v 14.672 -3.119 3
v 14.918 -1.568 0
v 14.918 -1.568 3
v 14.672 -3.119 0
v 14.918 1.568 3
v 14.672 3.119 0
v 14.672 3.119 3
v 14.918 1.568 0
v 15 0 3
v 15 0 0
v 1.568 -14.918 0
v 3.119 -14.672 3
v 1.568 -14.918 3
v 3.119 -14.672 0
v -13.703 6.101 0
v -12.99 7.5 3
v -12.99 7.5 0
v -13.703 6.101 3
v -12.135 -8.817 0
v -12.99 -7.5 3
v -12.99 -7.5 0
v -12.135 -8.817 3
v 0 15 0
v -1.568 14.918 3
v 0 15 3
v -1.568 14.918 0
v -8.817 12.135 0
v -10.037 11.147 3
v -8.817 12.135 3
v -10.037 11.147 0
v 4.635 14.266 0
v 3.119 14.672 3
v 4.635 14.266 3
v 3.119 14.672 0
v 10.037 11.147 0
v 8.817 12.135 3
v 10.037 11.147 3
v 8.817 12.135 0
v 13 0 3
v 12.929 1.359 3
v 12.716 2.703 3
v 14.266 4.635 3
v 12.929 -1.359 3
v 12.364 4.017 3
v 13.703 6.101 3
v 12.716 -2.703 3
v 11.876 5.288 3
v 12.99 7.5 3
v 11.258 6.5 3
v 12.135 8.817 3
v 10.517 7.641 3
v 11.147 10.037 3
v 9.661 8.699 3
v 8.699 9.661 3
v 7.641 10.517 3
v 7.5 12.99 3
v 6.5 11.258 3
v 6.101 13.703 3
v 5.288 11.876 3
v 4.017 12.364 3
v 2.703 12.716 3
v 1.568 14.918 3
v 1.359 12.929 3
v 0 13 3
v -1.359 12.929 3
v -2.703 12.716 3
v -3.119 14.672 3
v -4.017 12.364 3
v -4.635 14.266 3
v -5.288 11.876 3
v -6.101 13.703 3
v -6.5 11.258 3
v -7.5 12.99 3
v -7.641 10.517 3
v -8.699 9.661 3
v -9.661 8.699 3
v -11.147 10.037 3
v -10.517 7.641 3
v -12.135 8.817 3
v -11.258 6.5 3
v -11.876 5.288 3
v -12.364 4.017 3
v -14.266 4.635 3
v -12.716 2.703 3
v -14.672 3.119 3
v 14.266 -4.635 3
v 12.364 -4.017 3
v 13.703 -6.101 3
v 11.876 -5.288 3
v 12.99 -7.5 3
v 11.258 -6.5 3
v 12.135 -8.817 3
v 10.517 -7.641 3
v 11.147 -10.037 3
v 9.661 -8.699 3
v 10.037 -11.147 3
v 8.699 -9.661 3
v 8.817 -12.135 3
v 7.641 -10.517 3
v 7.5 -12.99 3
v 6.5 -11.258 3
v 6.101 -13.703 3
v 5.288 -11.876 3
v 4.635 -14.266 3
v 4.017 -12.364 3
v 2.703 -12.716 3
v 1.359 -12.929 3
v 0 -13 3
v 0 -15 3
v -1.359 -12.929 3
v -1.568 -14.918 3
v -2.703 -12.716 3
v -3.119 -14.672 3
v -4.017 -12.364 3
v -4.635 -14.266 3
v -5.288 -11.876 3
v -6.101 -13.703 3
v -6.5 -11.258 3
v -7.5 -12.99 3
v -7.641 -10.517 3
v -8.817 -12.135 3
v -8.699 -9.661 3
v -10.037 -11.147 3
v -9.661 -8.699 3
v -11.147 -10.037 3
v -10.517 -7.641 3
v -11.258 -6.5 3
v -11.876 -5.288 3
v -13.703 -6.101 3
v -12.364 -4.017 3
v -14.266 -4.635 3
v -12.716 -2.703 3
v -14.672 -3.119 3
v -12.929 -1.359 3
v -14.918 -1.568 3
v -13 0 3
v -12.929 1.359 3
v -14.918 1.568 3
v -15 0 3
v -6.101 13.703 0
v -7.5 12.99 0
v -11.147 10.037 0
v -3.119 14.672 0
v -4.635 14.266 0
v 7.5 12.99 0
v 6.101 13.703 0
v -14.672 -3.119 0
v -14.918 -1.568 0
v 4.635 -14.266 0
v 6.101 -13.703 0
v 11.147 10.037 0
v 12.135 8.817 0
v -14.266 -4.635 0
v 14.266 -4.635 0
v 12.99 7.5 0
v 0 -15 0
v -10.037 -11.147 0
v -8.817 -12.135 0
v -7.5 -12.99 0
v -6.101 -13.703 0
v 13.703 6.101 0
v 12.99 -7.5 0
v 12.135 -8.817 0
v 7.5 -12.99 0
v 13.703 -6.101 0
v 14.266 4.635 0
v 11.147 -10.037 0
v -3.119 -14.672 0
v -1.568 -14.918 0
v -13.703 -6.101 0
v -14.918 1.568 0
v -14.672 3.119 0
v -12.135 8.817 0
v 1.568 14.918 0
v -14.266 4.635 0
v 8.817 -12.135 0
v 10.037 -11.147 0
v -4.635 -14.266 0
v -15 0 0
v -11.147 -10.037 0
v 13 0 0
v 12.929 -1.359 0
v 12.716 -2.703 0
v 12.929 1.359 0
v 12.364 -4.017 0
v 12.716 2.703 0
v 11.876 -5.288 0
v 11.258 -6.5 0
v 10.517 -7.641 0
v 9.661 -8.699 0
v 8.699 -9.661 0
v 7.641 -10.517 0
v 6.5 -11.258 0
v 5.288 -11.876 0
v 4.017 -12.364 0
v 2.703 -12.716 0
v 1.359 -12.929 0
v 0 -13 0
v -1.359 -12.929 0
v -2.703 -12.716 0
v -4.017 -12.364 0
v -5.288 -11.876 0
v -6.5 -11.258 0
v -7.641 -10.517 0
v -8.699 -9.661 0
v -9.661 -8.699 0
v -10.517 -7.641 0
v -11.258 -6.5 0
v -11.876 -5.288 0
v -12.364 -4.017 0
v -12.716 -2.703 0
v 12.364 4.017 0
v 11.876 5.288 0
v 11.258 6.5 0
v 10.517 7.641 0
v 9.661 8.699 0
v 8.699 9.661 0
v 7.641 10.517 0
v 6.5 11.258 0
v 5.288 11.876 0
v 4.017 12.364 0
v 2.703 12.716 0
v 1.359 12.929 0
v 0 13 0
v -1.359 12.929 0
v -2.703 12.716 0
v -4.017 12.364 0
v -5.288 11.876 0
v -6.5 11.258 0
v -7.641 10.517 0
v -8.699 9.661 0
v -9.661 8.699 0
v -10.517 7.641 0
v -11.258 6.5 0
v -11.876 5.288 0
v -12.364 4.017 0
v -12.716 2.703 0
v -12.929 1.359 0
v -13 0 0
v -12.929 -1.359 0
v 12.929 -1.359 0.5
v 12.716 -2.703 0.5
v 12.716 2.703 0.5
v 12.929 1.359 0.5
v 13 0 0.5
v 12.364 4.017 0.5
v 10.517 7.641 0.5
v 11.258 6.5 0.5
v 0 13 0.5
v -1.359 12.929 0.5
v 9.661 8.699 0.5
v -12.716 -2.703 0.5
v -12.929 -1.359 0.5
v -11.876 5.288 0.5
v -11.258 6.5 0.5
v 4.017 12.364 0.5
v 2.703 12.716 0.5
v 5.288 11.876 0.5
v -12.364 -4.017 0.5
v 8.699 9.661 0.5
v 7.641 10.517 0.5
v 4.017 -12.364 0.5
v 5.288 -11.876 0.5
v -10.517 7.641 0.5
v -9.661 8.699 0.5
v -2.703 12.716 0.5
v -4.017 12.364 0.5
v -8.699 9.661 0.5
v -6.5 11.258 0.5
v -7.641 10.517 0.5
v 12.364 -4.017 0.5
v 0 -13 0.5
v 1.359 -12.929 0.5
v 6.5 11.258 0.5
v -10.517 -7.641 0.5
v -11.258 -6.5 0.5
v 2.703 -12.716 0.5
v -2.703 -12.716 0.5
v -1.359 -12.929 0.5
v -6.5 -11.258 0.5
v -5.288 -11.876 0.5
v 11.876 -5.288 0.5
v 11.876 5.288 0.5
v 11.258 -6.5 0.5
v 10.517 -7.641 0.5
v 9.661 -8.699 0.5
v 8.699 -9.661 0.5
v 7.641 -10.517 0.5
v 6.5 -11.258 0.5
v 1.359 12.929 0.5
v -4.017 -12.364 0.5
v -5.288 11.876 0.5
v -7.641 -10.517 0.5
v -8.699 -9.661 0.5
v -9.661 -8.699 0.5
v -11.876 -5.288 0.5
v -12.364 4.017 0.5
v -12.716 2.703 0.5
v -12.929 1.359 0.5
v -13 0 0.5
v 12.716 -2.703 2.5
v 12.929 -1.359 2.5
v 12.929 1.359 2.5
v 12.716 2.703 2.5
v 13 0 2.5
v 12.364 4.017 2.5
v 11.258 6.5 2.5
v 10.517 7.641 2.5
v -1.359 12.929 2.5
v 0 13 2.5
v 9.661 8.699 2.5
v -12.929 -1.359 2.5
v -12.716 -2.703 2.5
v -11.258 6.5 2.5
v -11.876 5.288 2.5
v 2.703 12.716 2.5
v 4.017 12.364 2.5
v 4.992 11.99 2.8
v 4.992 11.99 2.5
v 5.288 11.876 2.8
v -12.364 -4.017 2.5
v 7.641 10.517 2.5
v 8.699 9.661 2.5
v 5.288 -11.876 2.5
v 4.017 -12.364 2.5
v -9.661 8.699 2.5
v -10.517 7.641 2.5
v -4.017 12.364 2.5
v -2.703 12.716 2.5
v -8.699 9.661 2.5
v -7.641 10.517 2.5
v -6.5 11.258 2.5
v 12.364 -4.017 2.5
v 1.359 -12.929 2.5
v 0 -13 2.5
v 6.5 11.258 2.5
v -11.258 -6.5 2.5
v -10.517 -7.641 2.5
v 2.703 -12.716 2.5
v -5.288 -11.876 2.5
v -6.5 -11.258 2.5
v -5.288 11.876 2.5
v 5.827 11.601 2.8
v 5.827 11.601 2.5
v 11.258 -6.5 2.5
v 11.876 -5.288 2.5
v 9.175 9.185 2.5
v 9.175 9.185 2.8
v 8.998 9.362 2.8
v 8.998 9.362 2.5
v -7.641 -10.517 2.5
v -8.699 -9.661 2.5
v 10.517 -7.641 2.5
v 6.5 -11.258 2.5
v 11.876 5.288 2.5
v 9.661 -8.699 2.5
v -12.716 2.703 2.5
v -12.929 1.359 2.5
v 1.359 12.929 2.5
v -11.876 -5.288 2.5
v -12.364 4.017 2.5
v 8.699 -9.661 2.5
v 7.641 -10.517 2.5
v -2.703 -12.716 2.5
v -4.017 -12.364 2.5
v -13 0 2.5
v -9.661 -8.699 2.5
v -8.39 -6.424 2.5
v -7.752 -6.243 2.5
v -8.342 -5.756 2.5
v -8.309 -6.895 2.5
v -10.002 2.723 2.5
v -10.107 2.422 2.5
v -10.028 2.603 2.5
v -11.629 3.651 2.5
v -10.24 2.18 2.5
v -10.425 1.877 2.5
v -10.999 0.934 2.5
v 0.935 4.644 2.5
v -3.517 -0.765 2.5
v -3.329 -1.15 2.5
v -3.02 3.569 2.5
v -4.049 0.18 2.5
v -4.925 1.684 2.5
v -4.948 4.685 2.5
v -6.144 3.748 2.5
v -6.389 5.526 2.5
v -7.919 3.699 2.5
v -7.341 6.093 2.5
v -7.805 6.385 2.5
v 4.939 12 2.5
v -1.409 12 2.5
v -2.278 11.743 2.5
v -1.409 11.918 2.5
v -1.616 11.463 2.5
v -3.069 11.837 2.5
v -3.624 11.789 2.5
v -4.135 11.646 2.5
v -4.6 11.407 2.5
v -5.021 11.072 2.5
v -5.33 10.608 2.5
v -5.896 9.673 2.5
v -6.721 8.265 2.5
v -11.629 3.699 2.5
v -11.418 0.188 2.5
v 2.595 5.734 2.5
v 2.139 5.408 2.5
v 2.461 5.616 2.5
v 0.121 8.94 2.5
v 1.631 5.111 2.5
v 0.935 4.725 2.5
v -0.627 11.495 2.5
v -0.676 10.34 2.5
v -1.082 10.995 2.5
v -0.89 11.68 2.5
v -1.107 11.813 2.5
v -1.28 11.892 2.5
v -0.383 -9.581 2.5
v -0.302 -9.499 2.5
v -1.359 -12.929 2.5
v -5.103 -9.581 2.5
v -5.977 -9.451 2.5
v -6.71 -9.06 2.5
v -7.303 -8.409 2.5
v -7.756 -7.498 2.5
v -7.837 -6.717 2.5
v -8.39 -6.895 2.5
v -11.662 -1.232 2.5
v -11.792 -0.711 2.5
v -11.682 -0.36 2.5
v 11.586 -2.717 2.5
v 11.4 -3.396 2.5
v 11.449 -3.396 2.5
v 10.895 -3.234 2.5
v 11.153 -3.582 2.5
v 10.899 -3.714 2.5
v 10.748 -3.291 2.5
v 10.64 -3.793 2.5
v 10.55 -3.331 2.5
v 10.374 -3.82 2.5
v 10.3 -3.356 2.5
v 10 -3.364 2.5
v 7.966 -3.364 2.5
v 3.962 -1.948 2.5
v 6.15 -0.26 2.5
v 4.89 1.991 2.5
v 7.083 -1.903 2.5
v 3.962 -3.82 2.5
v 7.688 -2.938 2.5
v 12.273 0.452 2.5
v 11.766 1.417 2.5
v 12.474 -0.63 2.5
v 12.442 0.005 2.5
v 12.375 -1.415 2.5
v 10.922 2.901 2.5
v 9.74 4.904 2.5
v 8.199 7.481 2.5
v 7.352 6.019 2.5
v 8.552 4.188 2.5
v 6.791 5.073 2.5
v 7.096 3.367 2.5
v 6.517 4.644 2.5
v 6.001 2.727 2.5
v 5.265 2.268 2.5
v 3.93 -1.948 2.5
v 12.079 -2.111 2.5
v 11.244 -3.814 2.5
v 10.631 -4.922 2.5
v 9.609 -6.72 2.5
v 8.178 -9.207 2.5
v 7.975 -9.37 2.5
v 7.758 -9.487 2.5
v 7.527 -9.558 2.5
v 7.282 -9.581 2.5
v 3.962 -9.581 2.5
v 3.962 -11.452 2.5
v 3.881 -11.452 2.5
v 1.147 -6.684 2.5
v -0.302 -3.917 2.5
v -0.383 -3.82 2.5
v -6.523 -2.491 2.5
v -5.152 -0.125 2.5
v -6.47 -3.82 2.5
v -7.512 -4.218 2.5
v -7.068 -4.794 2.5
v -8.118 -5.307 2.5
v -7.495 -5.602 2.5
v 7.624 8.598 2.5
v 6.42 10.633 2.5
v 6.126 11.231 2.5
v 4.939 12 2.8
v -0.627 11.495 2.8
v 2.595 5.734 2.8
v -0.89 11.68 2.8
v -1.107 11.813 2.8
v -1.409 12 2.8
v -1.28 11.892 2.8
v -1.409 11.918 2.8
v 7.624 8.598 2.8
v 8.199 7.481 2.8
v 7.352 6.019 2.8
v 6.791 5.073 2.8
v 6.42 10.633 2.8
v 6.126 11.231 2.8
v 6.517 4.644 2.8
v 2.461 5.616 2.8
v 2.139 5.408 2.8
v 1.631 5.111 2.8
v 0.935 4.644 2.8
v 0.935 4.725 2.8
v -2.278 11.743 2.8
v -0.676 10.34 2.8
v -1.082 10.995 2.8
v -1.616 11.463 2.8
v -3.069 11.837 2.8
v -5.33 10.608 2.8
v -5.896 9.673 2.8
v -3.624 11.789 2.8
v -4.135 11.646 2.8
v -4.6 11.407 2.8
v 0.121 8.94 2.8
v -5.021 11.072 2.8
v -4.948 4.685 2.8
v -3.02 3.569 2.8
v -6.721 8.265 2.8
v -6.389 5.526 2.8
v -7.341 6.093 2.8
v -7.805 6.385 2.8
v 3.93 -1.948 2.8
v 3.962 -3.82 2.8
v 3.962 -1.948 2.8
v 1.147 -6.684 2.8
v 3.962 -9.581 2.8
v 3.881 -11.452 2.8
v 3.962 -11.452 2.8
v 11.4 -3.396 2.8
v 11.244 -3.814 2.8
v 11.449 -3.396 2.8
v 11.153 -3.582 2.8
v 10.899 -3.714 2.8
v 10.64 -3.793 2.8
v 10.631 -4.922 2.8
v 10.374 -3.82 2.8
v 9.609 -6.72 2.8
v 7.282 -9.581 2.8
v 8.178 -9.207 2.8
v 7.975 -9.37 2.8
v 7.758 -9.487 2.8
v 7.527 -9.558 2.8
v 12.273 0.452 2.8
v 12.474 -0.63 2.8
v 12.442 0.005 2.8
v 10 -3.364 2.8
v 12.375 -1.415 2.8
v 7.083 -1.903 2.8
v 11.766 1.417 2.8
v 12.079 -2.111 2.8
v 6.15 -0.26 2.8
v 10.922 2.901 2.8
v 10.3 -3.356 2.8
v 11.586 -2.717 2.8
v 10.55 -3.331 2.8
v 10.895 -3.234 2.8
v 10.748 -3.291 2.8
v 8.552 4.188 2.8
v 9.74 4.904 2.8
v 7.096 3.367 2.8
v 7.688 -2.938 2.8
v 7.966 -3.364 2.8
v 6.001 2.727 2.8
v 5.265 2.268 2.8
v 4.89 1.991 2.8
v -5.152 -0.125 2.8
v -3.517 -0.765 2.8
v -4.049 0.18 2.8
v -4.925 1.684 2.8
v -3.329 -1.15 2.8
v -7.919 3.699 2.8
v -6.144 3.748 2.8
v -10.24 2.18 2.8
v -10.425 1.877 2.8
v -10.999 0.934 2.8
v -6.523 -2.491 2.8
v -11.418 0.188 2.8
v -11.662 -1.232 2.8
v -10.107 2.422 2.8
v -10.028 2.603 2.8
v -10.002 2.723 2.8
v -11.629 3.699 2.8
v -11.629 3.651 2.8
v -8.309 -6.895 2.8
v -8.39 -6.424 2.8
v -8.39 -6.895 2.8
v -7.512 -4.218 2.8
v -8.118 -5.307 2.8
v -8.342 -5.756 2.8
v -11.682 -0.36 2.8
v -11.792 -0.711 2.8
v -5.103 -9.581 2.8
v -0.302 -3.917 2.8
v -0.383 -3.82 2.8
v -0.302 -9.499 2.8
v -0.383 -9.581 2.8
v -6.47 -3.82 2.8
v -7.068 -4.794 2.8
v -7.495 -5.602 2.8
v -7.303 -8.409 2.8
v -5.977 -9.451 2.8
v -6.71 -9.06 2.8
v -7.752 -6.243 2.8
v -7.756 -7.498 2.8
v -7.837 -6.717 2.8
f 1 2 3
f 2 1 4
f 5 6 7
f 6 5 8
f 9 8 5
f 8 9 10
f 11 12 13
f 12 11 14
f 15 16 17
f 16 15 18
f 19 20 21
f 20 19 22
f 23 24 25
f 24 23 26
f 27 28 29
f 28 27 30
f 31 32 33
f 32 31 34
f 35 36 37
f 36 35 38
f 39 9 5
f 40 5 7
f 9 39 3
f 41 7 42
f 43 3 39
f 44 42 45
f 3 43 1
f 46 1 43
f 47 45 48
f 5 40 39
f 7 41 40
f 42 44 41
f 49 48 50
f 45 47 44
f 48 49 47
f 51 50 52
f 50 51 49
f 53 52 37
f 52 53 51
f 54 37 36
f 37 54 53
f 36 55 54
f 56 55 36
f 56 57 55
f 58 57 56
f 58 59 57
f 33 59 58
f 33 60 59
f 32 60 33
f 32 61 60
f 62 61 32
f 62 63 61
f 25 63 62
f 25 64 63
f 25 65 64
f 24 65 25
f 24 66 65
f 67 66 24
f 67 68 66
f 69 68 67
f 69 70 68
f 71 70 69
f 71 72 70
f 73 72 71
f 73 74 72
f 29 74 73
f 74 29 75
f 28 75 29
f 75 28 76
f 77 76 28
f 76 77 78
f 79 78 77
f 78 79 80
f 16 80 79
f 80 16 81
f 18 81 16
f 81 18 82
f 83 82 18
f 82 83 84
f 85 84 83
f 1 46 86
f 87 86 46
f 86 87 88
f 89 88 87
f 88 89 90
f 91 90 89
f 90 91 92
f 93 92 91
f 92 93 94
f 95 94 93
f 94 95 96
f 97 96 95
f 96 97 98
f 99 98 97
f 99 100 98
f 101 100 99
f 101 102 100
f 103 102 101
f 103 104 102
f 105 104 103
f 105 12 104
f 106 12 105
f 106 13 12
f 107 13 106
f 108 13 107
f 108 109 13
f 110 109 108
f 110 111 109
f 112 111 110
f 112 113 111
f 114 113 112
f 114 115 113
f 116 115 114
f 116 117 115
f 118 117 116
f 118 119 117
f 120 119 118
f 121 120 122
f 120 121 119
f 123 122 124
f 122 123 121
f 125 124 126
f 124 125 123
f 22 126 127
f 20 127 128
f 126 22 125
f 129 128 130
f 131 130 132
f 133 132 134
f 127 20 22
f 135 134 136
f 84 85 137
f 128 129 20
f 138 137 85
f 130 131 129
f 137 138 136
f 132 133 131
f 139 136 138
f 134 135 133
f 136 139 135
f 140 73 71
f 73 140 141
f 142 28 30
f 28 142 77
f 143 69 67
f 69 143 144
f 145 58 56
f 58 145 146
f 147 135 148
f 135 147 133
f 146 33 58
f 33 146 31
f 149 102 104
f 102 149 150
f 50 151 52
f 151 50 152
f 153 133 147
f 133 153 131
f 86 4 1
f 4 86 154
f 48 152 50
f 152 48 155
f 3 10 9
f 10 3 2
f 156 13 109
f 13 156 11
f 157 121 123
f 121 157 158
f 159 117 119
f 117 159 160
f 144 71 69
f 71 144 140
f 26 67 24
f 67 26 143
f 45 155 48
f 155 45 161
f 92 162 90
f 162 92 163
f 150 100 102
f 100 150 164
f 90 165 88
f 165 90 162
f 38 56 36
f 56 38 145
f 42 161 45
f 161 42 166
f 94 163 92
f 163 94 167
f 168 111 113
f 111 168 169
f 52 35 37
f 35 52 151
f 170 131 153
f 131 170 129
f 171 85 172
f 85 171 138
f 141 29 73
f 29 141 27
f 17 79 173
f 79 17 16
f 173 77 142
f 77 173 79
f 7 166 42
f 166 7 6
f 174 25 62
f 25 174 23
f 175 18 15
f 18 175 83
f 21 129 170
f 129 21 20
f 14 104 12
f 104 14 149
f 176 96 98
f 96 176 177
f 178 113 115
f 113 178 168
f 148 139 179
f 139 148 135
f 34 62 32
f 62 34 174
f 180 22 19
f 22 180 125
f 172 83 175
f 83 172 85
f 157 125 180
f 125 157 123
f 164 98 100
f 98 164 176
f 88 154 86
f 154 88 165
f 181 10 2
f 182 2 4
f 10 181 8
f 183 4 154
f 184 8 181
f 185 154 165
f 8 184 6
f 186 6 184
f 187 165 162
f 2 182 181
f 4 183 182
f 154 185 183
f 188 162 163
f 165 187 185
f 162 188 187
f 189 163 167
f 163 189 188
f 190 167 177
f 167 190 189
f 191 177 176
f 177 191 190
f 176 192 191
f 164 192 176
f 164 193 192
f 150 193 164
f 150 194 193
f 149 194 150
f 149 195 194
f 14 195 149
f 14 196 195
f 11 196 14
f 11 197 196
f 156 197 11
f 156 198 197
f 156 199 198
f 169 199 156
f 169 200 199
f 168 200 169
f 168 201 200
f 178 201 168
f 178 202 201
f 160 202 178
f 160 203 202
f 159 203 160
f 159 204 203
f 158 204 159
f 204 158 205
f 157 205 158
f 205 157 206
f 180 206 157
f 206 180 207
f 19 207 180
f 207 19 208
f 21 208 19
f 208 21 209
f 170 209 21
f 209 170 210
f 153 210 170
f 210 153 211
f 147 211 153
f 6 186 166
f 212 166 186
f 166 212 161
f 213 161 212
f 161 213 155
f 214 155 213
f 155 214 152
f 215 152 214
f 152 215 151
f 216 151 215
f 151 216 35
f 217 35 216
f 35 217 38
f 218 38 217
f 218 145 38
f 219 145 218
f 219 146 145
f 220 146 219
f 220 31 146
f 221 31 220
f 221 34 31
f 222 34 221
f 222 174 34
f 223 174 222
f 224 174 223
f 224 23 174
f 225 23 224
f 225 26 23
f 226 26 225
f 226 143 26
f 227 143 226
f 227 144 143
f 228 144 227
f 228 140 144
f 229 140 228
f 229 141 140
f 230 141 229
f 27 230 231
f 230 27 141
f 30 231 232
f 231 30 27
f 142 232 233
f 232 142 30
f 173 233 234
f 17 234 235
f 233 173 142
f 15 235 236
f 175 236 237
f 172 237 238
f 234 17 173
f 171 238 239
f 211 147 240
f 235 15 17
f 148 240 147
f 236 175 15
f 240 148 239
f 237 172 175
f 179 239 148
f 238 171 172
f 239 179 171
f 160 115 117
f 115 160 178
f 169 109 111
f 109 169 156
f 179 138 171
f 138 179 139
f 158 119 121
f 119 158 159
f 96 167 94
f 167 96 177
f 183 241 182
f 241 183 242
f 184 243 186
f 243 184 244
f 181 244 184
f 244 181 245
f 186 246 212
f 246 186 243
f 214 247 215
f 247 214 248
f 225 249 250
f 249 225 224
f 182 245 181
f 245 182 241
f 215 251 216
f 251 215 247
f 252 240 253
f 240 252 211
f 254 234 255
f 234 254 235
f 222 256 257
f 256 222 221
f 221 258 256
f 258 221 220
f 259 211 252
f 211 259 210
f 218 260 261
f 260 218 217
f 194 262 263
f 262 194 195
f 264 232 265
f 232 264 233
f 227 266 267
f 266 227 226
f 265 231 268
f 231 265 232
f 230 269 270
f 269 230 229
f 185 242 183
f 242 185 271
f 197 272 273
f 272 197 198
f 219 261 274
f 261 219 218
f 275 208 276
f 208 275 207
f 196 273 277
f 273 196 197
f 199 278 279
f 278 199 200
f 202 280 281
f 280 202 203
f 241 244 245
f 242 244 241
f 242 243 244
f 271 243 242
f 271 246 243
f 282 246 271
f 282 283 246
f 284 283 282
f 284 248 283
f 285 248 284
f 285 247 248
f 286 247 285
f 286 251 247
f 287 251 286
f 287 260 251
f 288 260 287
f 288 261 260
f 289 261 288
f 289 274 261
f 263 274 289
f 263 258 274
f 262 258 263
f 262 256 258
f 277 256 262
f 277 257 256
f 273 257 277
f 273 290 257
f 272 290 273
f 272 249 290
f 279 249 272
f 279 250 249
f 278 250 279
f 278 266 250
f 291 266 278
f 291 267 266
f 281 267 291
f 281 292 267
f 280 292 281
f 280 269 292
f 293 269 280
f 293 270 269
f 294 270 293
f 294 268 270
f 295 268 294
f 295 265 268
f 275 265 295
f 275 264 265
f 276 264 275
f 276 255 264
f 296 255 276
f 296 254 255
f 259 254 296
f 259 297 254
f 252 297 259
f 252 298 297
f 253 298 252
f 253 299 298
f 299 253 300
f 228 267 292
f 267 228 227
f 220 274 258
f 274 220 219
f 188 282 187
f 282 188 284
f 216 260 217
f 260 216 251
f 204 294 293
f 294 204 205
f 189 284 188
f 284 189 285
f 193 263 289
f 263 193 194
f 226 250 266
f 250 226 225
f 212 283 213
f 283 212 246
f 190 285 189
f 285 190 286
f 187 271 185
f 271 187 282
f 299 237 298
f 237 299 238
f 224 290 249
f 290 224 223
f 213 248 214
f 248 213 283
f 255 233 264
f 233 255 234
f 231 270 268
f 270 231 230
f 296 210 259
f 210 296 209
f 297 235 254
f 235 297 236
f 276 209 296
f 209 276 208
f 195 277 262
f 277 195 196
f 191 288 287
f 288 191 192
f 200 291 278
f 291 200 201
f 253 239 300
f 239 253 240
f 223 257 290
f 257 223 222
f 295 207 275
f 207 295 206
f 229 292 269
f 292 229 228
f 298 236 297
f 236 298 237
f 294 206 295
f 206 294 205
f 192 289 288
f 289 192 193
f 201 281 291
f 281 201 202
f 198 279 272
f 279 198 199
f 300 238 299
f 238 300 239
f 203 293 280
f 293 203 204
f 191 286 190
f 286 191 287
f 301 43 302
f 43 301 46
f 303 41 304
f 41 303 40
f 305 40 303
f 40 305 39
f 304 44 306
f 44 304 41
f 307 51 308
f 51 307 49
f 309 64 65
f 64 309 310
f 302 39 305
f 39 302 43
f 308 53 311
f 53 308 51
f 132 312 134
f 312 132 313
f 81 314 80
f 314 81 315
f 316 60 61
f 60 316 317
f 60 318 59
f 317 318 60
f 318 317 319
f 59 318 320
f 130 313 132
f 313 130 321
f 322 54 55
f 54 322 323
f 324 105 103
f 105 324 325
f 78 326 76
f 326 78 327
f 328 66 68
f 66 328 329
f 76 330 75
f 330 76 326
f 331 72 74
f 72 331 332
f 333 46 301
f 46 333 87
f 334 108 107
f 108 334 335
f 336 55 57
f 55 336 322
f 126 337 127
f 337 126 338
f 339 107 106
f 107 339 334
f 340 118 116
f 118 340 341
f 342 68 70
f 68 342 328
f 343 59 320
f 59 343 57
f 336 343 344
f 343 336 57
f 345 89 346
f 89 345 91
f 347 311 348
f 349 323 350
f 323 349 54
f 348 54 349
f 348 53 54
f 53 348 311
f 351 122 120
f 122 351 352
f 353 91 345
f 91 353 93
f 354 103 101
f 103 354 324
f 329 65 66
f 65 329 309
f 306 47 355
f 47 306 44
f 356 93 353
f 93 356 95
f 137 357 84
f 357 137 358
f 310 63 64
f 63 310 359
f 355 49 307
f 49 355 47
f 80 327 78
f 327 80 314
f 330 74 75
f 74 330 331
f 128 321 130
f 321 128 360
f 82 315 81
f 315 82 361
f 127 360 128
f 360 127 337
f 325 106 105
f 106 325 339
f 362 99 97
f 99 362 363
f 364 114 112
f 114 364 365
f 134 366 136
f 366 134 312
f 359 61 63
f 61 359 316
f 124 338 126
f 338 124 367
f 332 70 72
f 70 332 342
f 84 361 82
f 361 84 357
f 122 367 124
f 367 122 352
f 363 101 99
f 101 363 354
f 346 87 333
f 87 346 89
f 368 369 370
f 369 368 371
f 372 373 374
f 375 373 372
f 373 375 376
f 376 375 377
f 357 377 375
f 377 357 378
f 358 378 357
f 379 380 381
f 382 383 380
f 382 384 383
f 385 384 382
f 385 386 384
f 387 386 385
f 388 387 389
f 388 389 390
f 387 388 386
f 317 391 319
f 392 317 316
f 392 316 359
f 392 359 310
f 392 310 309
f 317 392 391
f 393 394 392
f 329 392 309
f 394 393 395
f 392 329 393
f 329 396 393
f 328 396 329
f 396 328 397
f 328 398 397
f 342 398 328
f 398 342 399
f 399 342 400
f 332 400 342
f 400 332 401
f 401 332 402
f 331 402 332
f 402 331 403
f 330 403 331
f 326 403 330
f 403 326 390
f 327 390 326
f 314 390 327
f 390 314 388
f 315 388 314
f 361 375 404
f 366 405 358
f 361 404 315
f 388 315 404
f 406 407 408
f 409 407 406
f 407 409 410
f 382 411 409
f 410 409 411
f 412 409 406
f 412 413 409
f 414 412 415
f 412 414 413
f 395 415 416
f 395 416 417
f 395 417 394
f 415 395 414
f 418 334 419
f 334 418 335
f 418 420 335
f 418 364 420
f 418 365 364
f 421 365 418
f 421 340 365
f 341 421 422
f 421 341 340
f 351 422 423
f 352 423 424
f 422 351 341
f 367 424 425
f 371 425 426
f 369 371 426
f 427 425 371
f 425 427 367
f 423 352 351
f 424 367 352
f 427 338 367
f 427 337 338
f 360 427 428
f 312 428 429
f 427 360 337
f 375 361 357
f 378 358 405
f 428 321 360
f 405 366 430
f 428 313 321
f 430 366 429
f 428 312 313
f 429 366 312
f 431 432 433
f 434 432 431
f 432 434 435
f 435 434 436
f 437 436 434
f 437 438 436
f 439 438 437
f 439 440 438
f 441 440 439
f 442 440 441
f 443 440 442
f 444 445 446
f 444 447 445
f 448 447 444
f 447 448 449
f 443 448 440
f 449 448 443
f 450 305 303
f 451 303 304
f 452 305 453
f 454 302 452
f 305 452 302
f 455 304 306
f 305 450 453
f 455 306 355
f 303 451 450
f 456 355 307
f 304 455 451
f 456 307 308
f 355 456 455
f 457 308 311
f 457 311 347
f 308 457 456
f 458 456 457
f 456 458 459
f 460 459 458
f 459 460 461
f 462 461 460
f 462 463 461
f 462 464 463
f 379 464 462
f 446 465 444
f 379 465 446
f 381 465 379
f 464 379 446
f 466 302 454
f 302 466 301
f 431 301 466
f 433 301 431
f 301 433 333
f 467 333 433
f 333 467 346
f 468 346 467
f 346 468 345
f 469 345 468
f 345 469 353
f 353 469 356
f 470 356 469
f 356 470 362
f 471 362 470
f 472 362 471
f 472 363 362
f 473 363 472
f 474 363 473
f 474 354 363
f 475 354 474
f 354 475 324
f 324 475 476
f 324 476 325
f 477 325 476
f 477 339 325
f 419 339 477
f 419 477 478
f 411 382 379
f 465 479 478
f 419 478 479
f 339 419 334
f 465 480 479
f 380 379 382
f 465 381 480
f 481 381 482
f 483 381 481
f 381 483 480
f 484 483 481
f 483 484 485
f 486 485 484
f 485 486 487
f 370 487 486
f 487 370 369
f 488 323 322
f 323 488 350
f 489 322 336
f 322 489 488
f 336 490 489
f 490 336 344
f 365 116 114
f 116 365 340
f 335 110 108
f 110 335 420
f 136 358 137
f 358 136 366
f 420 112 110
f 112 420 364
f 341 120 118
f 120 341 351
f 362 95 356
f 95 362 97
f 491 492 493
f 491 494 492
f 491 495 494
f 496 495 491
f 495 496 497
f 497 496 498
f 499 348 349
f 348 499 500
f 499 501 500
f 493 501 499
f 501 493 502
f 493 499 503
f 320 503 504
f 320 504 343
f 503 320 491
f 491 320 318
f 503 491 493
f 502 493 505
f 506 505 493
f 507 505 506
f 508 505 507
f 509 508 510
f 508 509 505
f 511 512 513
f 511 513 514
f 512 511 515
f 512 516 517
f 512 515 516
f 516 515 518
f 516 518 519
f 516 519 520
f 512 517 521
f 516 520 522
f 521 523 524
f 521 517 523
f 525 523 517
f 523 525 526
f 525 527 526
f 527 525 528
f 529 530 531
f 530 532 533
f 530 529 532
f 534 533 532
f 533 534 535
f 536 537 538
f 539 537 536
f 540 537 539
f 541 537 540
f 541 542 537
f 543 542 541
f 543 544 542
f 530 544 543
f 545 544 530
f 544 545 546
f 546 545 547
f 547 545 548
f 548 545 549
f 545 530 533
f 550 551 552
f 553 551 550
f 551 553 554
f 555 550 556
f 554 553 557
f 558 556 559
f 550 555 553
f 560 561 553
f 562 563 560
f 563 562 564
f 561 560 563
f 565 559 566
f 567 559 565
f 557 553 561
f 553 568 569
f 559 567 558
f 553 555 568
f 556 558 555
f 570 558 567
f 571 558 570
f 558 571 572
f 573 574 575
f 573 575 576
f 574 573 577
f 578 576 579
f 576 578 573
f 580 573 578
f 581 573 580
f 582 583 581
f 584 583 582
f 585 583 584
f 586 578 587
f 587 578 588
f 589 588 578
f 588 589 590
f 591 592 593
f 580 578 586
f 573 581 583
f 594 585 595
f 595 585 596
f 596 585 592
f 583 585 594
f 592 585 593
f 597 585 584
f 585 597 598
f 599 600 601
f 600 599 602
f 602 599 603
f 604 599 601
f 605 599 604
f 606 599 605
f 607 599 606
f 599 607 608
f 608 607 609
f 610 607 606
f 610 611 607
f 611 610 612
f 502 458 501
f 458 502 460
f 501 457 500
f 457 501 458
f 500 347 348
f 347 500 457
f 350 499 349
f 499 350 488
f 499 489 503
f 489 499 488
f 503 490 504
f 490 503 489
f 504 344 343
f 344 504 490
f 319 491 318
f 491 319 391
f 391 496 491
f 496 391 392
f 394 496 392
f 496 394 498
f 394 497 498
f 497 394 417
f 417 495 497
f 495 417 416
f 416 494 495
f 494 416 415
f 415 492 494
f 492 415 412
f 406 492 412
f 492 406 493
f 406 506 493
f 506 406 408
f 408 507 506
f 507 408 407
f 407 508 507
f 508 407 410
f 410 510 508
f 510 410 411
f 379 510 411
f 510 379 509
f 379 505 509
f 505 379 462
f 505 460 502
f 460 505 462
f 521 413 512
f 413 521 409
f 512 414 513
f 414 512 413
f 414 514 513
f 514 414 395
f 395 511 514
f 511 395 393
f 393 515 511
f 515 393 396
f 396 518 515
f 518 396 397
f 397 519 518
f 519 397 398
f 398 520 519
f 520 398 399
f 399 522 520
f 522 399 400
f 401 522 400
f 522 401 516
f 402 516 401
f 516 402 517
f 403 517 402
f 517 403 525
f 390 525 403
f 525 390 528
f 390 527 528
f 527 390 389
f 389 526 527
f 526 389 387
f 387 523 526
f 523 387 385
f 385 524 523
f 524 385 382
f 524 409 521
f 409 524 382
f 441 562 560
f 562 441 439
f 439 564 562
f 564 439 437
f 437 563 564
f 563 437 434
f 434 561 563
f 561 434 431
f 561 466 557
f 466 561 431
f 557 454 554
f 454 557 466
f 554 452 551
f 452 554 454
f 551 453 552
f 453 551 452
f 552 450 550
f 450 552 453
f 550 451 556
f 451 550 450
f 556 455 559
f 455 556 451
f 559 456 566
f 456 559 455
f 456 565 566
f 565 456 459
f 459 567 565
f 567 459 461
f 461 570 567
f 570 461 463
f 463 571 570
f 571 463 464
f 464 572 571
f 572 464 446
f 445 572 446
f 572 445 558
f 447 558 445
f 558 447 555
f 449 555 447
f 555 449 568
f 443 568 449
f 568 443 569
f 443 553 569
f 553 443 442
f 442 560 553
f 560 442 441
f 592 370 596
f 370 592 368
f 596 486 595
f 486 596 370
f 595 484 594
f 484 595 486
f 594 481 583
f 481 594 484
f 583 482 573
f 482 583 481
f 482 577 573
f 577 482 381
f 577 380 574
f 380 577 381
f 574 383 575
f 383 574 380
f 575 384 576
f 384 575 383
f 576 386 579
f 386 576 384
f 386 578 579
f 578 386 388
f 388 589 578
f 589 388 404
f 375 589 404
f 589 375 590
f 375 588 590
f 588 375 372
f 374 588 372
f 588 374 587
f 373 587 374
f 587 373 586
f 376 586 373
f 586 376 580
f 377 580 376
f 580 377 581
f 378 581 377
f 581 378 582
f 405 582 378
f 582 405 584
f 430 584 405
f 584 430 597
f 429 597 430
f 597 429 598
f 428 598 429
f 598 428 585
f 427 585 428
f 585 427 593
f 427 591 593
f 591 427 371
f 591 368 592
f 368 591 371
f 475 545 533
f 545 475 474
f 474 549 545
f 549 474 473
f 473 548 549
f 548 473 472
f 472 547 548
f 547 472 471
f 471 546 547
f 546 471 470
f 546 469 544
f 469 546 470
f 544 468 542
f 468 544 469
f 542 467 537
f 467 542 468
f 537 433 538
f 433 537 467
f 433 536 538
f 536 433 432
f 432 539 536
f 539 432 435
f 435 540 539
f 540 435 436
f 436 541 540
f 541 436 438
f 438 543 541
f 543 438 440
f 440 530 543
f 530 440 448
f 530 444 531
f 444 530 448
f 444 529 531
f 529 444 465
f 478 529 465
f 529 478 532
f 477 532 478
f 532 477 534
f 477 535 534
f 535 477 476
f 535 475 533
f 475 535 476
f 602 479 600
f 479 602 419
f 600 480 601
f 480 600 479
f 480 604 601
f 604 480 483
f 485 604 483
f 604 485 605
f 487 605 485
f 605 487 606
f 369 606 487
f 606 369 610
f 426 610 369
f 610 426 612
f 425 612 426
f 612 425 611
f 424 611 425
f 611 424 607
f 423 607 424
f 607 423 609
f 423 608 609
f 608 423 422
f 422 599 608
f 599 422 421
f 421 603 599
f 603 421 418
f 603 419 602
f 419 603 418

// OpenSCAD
// file: modules/token-empty.scad
module token_empty(diameter_mm=30, thickness_mm=3, ridge_width_mm=2, ridge_depth_mm=0.5) {
    $fn=60;
    difference() {
        cylinder(r=diameter_mm/2, h=thickness_mm);
        translate([0,0,-ridge_depth_mm]) {
            cylinder(r=diameter_mm/2-ridge_width_mm, h=2*ridge_depth_mm);
        }
        cylinder(r=diameter_mm/2-ridge_width_mm, h=ridge_depth_mm);
        translate([0,0,thickness_mm-ridge_depth_mm]) {
            cylinder(r=diameter_mm/2-ridge_width_mm, h=2-ridge_depth_mm);
        }
    }
}

token_empty();
// file: modules/token-sign.scad
use <token-empty.scad>

module token_with_sign(sign, adjust_height_mm=0, font="Arial Unicode MS", sign_thickness_mm=0.3, size=14, diameter_mm=30, thickness_mm=3, ridge_width_mm=2, ridge_depth_mm=0.5) {
    token_empty(diameter_mm, thickness_mm, ridge_width_mm, ridge_depth_mm);
    translate([0, adjust_height_mm, thickness_mm-ridge_depth_mm+sign_thickness_mm]) {
        scale([1,1,-2*sign_thickness_mm]) {
            linear_extrude(1) text(sign, halign="center", valign="center", size=size, font=font);
        }
    }
}

token_with_sign(sign="❤︎", adjust_height_mm=-1.5);
//token_with_sign(sign="❥");
// main file
use <modules/token-sign.scad>

token_with_sign(sign="♻︎", adjust_height_mm=0, font="DejaVu Sans Mono for Powerline", size=24);
